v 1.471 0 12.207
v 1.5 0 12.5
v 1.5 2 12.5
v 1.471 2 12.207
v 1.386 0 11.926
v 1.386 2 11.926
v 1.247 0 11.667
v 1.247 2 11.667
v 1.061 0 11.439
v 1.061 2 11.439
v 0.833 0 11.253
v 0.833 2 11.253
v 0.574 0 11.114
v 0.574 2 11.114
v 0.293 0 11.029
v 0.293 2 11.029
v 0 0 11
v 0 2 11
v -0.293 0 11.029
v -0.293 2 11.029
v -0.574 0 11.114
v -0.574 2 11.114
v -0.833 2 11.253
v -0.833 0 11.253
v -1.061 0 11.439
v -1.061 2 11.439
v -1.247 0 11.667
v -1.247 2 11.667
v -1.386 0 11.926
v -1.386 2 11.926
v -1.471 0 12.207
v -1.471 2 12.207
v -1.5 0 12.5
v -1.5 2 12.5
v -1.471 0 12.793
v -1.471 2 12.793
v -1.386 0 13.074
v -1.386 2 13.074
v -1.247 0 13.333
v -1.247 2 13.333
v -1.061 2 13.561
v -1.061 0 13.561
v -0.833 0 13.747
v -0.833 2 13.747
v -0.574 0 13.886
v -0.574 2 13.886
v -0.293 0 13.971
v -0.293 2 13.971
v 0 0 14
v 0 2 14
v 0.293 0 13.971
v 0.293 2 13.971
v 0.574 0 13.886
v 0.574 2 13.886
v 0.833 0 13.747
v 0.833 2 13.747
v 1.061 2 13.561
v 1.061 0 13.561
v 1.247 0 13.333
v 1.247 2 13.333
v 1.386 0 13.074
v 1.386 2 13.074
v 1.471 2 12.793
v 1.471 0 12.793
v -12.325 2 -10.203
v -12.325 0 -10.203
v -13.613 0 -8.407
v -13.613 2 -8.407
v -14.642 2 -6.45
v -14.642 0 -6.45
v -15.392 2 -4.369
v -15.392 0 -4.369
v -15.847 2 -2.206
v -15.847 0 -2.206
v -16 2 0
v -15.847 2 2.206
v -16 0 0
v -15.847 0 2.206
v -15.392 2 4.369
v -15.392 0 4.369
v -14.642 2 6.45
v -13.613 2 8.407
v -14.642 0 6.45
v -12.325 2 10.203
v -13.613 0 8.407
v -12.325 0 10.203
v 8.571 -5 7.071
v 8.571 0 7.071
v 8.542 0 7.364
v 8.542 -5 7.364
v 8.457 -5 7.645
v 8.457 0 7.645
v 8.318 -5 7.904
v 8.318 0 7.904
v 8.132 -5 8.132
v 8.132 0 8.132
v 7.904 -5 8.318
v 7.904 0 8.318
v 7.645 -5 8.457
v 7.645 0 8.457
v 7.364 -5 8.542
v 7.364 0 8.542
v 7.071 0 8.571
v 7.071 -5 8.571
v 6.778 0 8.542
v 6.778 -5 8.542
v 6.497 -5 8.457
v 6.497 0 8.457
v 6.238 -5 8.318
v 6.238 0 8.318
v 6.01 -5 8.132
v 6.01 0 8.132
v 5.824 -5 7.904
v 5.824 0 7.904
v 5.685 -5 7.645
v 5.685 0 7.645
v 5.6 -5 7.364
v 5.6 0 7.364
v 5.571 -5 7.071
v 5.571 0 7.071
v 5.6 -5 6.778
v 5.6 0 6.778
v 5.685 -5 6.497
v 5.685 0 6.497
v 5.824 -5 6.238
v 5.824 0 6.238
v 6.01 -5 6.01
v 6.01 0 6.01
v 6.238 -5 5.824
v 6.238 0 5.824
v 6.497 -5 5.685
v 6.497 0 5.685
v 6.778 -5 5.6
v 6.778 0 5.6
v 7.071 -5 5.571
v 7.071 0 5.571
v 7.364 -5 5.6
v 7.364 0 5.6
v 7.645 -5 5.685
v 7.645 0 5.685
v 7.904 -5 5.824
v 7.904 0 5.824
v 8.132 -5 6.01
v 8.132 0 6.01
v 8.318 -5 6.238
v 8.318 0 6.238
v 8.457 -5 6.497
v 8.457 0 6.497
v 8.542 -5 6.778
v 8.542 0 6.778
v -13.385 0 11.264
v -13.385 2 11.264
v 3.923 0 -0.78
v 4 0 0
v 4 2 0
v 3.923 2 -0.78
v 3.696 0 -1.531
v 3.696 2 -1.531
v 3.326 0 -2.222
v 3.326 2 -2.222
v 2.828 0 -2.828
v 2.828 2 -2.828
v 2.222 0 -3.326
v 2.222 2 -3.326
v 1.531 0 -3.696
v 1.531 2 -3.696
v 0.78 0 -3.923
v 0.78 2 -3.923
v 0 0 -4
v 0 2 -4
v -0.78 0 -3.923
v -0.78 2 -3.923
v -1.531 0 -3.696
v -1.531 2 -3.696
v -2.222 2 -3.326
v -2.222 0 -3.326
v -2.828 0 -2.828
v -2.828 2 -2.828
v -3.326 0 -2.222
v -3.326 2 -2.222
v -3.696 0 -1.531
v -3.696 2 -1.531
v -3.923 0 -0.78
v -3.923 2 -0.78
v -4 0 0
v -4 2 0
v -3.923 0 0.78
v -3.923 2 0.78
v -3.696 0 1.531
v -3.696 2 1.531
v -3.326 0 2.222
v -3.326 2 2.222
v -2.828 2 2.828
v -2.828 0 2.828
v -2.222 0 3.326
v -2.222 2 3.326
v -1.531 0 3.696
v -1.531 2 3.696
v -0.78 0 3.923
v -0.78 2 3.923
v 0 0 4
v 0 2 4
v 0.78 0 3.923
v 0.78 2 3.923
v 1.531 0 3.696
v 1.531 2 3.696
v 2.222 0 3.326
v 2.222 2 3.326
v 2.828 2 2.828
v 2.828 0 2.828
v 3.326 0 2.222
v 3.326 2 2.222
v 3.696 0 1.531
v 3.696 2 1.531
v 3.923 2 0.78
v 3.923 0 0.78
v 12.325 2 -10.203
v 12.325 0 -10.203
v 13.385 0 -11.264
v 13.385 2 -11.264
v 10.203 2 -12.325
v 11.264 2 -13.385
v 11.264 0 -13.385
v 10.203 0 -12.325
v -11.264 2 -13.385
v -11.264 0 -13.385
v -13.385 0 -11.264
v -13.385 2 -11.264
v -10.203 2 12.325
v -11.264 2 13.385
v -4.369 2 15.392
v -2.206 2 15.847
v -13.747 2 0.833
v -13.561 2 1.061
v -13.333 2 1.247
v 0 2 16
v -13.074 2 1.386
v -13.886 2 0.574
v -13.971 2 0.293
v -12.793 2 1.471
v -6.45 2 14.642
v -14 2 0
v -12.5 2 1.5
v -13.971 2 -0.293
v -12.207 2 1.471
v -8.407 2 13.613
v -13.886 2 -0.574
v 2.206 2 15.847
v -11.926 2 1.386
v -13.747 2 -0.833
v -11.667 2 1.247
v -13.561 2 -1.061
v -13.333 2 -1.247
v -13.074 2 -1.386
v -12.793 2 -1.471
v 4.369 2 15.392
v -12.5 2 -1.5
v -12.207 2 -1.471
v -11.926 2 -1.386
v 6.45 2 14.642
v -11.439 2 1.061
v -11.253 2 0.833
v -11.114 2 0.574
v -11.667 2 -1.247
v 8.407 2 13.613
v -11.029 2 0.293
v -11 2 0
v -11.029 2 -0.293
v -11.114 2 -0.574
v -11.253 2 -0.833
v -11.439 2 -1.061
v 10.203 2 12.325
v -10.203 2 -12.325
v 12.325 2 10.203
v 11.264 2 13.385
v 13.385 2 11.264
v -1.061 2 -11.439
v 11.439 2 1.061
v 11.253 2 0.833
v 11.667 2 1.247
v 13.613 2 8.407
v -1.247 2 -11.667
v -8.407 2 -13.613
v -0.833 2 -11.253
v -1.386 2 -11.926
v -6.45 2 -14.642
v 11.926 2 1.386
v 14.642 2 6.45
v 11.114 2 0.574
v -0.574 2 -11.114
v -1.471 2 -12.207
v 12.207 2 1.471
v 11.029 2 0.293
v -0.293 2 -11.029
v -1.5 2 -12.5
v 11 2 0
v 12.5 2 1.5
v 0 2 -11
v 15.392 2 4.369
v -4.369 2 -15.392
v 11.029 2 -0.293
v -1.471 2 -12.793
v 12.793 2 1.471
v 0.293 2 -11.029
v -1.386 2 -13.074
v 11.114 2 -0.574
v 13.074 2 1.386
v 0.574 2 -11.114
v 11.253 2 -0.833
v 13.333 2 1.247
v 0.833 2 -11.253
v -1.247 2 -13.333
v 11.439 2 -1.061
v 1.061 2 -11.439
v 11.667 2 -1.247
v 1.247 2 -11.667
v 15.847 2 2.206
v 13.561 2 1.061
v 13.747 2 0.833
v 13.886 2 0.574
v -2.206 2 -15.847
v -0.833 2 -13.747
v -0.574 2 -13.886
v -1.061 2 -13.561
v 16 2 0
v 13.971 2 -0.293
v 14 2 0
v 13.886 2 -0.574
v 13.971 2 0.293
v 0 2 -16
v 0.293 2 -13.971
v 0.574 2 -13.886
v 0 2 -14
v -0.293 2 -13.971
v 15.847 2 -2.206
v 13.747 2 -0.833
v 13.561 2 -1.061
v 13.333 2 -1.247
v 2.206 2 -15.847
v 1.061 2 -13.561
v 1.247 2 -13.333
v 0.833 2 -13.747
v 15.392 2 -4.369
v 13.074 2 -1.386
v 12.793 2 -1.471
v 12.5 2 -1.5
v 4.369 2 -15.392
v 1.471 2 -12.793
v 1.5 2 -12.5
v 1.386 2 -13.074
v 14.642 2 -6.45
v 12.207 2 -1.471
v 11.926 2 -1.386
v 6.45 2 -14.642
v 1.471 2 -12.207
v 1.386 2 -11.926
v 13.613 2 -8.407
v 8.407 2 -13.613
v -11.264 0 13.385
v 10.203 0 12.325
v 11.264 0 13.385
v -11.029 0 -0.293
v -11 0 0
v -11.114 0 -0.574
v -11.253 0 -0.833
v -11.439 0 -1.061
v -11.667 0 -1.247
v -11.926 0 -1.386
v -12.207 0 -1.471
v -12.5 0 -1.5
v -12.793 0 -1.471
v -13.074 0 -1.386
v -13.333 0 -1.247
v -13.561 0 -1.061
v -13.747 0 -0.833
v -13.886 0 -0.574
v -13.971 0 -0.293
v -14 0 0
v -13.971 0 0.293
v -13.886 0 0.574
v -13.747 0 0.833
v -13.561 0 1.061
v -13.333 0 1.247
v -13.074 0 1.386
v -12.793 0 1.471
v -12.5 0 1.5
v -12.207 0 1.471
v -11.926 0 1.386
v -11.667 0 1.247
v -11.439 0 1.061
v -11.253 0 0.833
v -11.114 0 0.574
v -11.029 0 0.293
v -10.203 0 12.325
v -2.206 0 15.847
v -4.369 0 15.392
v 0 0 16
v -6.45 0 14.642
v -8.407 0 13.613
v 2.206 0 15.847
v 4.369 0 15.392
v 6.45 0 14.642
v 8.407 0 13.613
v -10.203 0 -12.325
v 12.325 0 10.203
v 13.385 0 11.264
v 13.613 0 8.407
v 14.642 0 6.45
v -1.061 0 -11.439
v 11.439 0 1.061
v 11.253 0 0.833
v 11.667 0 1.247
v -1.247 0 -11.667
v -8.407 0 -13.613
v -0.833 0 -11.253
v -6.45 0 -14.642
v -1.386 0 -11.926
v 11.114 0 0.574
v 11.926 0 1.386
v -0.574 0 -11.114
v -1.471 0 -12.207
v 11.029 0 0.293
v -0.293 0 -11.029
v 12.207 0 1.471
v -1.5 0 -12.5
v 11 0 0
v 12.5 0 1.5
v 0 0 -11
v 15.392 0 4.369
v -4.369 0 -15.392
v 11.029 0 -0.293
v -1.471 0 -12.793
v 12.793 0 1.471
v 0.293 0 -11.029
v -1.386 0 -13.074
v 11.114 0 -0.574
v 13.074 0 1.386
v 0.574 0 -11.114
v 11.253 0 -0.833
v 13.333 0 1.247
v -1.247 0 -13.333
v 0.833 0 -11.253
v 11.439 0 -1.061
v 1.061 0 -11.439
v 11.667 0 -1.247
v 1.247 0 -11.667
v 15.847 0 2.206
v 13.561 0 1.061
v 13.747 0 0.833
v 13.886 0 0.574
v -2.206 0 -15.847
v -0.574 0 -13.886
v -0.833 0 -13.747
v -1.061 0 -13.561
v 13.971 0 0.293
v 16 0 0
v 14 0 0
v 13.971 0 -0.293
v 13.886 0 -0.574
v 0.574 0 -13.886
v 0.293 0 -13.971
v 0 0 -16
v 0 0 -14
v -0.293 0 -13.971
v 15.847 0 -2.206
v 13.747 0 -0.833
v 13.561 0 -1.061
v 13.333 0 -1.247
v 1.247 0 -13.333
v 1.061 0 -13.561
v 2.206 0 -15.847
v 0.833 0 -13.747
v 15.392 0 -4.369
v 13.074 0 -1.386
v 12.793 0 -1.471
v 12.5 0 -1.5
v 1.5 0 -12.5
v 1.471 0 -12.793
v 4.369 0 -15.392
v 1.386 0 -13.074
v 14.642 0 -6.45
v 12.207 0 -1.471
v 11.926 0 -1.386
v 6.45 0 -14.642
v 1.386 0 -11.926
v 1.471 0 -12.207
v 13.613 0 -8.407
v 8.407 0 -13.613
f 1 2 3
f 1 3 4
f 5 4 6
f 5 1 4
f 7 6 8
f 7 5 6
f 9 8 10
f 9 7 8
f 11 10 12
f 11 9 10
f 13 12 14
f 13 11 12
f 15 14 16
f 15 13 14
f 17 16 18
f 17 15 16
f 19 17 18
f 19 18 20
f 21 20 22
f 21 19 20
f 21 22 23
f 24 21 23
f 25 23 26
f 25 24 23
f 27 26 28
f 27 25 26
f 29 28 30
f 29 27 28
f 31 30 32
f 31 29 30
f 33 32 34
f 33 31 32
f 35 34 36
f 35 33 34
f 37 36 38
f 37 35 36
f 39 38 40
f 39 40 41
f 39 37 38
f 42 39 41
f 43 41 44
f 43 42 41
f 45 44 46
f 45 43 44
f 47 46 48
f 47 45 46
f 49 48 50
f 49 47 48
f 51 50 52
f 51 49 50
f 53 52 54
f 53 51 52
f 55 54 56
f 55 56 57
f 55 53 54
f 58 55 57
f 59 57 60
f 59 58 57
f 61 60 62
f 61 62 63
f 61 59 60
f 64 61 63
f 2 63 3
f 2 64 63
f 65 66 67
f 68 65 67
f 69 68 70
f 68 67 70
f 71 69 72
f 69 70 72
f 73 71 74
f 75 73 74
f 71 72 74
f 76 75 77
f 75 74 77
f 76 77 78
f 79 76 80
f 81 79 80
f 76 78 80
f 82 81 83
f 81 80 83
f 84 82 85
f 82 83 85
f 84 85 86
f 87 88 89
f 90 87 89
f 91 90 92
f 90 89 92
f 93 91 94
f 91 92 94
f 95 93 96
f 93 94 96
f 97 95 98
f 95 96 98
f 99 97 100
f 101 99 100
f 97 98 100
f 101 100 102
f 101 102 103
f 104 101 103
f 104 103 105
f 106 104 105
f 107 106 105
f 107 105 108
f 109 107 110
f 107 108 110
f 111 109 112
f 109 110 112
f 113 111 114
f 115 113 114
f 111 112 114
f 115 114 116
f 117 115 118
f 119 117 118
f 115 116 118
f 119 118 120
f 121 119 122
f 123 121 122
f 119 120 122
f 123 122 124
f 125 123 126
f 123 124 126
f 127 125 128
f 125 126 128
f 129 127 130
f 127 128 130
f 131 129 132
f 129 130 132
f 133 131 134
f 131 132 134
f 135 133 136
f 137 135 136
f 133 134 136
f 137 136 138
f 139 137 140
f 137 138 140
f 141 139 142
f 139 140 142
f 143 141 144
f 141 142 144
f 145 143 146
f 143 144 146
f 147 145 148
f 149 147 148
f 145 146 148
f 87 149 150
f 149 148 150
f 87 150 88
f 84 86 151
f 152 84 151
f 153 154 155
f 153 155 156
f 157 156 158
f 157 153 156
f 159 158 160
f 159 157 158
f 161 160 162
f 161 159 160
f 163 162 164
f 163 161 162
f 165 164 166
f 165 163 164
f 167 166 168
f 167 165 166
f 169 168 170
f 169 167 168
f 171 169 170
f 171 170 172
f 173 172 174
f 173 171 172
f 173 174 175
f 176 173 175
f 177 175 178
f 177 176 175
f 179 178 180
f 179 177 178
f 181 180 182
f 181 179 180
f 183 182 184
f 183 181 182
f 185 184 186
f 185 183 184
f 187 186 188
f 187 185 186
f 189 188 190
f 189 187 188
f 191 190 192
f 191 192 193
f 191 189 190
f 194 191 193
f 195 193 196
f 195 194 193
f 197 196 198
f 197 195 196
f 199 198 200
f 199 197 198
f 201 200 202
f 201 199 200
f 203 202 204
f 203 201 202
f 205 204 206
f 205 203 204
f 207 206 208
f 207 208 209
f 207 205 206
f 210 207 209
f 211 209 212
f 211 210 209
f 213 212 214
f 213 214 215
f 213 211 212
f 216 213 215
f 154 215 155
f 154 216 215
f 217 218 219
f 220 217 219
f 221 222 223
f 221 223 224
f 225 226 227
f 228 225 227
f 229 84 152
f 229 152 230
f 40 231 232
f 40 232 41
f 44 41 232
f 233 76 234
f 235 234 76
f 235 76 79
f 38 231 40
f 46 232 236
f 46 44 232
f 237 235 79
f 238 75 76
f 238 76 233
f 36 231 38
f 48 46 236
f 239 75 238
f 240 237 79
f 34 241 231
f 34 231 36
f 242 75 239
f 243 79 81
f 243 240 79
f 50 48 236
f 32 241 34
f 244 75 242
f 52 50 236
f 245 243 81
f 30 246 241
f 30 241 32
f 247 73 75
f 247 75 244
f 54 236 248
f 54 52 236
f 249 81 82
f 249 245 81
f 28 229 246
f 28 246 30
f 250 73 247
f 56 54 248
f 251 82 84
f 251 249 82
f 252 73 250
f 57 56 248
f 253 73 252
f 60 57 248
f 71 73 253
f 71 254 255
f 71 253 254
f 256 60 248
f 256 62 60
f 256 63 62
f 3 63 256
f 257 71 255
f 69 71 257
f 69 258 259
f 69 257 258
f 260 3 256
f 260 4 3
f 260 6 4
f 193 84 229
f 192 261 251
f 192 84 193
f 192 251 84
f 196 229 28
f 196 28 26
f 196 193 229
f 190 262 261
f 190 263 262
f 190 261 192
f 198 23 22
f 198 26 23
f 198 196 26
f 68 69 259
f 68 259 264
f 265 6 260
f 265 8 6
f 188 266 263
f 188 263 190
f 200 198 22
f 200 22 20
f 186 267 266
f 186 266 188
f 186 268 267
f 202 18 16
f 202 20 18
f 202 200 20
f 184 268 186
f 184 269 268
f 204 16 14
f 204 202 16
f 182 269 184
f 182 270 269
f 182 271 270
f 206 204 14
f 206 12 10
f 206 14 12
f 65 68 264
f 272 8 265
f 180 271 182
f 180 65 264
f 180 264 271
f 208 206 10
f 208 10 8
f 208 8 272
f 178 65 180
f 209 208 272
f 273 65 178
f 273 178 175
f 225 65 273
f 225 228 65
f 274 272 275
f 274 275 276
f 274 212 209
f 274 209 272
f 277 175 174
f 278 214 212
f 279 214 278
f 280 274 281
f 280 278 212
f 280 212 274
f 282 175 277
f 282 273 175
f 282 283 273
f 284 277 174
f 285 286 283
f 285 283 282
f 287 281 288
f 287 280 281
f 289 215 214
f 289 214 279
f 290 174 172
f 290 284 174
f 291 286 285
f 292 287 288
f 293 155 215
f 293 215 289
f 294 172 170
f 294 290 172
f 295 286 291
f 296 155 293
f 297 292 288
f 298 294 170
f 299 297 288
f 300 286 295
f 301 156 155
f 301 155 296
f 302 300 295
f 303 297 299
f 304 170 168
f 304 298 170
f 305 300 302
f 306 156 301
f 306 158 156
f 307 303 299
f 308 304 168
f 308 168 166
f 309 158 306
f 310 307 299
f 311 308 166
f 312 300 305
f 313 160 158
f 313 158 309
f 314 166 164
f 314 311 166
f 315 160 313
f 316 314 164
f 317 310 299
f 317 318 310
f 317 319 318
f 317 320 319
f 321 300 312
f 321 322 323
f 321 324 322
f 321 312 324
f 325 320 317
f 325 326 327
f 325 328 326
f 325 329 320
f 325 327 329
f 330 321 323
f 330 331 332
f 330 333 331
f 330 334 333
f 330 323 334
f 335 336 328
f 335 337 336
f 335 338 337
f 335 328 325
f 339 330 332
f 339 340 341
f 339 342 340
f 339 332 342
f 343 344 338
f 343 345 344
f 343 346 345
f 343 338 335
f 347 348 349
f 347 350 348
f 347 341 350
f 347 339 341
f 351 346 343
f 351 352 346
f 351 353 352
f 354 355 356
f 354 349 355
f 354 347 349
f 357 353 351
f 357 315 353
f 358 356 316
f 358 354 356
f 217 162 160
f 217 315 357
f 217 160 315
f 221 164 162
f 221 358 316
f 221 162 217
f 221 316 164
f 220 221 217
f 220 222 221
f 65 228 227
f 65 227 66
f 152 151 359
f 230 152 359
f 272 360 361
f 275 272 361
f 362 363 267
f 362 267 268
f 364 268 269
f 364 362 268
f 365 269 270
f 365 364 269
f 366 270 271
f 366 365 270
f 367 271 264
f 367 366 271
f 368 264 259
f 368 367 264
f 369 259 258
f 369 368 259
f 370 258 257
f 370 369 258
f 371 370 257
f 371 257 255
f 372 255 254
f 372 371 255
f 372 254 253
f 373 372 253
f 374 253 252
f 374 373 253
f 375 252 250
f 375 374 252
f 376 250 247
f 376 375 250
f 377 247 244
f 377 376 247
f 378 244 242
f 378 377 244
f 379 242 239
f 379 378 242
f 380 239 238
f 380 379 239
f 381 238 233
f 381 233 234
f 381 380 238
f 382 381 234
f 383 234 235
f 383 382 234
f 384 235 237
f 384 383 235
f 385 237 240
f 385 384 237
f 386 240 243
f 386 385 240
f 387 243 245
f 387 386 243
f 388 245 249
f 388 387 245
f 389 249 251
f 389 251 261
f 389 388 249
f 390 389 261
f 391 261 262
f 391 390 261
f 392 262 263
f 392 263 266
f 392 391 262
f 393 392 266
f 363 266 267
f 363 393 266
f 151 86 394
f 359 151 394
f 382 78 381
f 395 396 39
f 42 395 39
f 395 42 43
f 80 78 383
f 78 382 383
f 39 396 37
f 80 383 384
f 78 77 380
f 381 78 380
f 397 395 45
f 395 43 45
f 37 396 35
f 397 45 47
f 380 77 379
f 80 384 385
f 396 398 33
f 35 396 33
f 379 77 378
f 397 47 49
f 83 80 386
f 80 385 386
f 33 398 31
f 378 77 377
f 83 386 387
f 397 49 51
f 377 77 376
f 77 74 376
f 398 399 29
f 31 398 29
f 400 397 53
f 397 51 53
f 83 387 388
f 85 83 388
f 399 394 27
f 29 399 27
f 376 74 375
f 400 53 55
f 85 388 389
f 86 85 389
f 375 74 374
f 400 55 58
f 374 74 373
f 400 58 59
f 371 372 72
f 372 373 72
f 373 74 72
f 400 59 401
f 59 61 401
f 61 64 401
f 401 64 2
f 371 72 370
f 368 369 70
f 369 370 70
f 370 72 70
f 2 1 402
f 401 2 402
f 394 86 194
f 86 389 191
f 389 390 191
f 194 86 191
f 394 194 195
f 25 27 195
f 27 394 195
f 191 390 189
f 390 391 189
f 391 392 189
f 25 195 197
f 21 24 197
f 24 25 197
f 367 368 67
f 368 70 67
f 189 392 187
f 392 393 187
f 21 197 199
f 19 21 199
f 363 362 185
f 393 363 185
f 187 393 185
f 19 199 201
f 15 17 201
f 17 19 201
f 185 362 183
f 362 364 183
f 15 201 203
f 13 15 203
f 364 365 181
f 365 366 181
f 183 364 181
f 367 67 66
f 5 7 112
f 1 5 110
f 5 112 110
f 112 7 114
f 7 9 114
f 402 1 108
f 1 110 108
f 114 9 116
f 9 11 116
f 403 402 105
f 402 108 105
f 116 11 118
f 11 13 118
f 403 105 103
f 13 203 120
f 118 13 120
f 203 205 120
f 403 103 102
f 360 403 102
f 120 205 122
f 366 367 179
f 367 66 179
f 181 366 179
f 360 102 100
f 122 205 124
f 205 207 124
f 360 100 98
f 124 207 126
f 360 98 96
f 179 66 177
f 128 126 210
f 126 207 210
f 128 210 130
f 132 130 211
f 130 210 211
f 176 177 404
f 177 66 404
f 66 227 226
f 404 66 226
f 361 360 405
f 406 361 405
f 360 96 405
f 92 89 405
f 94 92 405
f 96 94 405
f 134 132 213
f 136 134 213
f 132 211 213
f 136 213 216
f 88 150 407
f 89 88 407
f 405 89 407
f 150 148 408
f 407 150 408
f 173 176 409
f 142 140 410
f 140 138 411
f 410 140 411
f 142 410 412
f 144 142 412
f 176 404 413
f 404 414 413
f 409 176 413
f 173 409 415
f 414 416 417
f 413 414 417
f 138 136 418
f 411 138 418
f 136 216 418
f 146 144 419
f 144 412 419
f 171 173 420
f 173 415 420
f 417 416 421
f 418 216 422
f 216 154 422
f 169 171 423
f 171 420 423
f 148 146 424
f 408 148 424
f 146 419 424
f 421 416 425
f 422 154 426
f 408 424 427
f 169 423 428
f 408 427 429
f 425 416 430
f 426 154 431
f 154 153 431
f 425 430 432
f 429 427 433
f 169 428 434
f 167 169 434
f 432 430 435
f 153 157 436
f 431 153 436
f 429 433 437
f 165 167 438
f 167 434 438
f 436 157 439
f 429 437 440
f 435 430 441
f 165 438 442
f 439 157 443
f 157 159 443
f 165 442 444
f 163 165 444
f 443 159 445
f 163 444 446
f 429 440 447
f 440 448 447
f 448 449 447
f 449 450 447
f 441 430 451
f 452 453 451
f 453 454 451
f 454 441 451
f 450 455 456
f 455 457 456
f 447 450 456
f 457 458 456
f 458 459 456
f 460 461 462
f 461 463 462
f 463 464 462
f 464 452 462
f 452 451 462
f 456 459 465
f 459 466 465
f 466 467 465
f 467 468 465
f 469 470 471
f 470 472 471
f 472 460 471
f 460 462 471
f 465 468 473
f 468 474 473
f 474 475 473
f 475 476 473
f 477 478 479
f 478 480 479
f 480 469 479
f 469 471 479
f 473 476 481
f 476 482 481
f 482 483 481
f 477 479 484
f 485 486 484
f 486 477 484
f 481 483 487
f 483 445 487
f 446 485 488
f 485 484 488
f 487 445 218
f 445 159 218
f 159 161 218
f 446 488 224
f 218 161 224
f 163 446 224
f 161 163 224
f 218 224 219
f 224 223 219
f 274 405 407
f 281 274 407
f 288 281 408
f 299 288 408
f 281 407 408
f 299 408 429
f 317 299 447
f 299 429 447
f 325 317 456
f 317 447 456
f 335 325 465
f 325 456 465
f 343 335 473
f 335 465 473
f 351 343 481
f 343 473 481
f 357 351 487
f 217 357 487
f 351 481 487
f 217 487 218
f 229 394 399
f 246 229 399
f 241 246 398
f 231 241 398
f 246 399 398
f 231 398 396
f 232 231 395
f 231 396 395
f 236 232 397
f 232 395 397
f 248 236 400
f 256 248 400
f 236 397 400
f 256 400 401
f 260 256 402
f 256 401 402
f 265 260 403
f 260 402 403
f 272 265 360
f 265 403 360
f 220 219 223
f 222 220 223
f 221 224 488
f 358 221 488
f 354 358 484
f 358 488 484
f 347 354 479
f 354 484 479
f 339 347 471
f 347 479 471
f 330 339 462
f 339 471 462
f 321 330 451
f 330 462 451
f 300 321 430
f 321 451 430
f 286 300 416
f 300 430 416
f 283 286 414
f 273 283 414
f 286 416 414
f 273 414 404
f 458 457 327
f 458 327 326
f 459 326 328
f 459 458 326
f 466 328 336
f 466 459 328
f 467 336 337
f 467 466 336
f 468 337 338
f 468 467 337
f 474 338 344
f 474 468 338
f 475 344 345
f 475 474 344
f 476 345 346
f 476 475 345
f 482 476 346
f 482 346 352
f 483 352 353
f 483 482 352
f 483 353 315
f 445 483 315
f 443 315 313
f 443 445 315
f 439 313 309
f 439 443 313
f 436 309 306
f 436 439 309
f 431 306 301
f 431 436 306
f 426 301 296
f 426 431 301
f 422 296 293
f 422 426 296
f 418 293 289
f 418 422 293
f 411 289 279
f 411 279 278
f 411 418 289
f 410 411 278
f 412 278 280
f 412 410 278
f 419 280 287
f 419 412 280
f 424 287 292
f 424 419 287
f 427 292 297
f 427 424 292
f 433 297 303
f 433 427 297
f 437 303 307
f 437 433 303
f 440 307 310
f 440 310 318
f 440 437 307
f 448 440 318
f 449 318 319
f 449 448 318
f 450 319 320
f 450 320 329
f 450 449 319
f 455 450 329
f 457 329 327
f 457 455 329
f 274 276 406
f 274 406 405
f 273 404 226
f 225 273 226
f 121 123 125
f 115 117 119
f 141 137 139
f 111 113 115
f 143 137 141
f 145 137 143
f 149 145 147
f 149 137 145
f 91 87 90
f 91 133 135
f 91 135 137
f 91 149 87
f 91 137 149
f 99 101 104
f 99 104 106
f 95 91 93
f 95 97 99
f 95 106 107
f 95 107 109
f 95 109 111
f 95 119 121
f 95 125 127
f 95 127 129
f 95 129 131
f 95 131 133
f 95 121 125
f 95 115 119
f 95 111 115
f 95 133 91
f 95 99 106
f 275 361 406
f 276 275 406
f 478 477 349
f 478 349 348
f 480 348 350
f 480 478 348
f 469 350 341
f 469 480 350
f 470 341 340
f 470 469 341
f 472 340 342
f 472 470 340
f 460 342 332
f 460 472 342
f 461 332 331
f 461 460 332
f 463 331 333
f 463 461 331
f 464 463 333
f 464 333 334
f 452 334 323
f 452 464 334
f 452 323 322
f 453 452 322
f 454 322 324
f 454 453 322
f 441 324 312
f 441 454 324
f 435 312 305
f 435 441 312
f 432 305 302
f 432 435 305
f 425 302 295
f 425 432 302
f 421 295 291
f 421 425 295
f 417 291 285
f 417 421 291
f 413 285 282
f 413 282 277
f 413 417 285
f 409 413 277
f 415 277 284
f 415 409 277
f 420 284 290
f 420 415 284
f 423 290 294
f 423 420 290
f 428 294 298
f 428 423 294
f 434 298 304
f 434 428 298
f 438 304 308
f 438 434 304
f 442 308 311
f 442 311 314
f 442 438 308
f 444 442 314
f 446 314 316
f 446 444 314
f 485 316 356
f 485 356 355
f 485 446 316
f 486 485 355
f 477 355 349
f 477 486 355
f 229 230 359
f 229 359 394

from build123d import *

# Parameters (mm, degrees)
SKETCH1_R           = 16
SKETCH1_R_2         = 1.5
SKETCH1_R_3         = 4
BOSS_EXTRUDE1_DEPTH = 2
SKETCH2_R           = 1.5
BOSS_EXTRUDE2_DEPTH = 5


with BuildPart() as part:
    # Sketch1 → Boss-Extrude1 (new body)
    with BuildSketch(Plane(origin=(0, 0, 0), x_dir=(1, 0, 0), z_dir=(0, 1, 0))):
        Circle(SKETCH1_R)
        with Locations((-12.5, 0)):
            Circle(SKETCH1_R_2, mode=Mode.SUBTRACT)
        with Locations((0, -12.5)):
            Circle(SKETCH1_R_2, mode=Mode.SUBTRACT)
        with Locations((12.5, 0)):
            Circle(SKETCH1_R_2, mode=Mode.SUBTRACT)
        with Locations((0, 12.5)):
            Circle(SKETCH1_R_2, mode=Mode.SUBTRACT)
        Circle(SKETCH1_R_3, mode=Mode.SUBTRACT)
        with BuildLine():
            ThreePointArc((-10.203220154, -12.324540498), (-11.313708499, -11.313708499), (-12.324540498, -10.203220154))
            Line((-12.324540498, -10.203220154), (-13.38520067, -11.263880326))
            Line((-13.38520067, -11.263880326), (-11.263880326, -13.38520067))
            Line((-11.263880326, -13.38520067), (-10.203220154, -12.324540498))
        make_face()
        with BuildLine():
            Line((13.38520067, -11.263880326), (12.324540498, -10.203220154))
            ThreePointArc((12.324540498, -10.203220154), (11.313708499, -11.313708499), (10.203220154, -12.324540498))
            Line((10.203220154, -12.324540498), (11.263880326, -13.38520067))
            Line((11.263880326, -13.38520067), (13.38520067, -11.263880326))
        make_face()
        with BuildLine():
            Line((13.38520067, 11.263880326), (11.263880326, 13.38520067))
            Line((11.263880326, 13.38520067), (10.203220154, 12.324540498))
            ThreePointArc((10.203220154, 12.324540498), (11.313708499, 11.313708499), (12.324540498, 10.203220154))
            Line((12.324540498, 10.203220154), (13.38520067, 11.263880326))
        make_face()
        with BuildLine():
            ThreePointArc((-12.324540498, 10.203220154), (-11.313708499, 11.313708499), (-10.203220154, 12.324540498))
            Line((-10.203220154, 12.324540498), (-11.263880326, 13.38520067))
            Line((-11.263880326, 13.38520067), (-13.38520067, 11.263880326))
            Line((-13.38520067, 11.263880326), (-12.324540498, 10.203220154))
        make_face()
    extrude(amount=BOSS_EXTRUDE1_DEPTH)

    # Sketch2 → Boss-Extrude2 (add)
    with BuildSketch(Plane.XZ):
        with Locations((7.071067812, 7.071067812)):
            Circle(SKETCH2_R)
    extrude(amount=BOSS_EXTRUDE2_DEPTH)


solid = part.part
